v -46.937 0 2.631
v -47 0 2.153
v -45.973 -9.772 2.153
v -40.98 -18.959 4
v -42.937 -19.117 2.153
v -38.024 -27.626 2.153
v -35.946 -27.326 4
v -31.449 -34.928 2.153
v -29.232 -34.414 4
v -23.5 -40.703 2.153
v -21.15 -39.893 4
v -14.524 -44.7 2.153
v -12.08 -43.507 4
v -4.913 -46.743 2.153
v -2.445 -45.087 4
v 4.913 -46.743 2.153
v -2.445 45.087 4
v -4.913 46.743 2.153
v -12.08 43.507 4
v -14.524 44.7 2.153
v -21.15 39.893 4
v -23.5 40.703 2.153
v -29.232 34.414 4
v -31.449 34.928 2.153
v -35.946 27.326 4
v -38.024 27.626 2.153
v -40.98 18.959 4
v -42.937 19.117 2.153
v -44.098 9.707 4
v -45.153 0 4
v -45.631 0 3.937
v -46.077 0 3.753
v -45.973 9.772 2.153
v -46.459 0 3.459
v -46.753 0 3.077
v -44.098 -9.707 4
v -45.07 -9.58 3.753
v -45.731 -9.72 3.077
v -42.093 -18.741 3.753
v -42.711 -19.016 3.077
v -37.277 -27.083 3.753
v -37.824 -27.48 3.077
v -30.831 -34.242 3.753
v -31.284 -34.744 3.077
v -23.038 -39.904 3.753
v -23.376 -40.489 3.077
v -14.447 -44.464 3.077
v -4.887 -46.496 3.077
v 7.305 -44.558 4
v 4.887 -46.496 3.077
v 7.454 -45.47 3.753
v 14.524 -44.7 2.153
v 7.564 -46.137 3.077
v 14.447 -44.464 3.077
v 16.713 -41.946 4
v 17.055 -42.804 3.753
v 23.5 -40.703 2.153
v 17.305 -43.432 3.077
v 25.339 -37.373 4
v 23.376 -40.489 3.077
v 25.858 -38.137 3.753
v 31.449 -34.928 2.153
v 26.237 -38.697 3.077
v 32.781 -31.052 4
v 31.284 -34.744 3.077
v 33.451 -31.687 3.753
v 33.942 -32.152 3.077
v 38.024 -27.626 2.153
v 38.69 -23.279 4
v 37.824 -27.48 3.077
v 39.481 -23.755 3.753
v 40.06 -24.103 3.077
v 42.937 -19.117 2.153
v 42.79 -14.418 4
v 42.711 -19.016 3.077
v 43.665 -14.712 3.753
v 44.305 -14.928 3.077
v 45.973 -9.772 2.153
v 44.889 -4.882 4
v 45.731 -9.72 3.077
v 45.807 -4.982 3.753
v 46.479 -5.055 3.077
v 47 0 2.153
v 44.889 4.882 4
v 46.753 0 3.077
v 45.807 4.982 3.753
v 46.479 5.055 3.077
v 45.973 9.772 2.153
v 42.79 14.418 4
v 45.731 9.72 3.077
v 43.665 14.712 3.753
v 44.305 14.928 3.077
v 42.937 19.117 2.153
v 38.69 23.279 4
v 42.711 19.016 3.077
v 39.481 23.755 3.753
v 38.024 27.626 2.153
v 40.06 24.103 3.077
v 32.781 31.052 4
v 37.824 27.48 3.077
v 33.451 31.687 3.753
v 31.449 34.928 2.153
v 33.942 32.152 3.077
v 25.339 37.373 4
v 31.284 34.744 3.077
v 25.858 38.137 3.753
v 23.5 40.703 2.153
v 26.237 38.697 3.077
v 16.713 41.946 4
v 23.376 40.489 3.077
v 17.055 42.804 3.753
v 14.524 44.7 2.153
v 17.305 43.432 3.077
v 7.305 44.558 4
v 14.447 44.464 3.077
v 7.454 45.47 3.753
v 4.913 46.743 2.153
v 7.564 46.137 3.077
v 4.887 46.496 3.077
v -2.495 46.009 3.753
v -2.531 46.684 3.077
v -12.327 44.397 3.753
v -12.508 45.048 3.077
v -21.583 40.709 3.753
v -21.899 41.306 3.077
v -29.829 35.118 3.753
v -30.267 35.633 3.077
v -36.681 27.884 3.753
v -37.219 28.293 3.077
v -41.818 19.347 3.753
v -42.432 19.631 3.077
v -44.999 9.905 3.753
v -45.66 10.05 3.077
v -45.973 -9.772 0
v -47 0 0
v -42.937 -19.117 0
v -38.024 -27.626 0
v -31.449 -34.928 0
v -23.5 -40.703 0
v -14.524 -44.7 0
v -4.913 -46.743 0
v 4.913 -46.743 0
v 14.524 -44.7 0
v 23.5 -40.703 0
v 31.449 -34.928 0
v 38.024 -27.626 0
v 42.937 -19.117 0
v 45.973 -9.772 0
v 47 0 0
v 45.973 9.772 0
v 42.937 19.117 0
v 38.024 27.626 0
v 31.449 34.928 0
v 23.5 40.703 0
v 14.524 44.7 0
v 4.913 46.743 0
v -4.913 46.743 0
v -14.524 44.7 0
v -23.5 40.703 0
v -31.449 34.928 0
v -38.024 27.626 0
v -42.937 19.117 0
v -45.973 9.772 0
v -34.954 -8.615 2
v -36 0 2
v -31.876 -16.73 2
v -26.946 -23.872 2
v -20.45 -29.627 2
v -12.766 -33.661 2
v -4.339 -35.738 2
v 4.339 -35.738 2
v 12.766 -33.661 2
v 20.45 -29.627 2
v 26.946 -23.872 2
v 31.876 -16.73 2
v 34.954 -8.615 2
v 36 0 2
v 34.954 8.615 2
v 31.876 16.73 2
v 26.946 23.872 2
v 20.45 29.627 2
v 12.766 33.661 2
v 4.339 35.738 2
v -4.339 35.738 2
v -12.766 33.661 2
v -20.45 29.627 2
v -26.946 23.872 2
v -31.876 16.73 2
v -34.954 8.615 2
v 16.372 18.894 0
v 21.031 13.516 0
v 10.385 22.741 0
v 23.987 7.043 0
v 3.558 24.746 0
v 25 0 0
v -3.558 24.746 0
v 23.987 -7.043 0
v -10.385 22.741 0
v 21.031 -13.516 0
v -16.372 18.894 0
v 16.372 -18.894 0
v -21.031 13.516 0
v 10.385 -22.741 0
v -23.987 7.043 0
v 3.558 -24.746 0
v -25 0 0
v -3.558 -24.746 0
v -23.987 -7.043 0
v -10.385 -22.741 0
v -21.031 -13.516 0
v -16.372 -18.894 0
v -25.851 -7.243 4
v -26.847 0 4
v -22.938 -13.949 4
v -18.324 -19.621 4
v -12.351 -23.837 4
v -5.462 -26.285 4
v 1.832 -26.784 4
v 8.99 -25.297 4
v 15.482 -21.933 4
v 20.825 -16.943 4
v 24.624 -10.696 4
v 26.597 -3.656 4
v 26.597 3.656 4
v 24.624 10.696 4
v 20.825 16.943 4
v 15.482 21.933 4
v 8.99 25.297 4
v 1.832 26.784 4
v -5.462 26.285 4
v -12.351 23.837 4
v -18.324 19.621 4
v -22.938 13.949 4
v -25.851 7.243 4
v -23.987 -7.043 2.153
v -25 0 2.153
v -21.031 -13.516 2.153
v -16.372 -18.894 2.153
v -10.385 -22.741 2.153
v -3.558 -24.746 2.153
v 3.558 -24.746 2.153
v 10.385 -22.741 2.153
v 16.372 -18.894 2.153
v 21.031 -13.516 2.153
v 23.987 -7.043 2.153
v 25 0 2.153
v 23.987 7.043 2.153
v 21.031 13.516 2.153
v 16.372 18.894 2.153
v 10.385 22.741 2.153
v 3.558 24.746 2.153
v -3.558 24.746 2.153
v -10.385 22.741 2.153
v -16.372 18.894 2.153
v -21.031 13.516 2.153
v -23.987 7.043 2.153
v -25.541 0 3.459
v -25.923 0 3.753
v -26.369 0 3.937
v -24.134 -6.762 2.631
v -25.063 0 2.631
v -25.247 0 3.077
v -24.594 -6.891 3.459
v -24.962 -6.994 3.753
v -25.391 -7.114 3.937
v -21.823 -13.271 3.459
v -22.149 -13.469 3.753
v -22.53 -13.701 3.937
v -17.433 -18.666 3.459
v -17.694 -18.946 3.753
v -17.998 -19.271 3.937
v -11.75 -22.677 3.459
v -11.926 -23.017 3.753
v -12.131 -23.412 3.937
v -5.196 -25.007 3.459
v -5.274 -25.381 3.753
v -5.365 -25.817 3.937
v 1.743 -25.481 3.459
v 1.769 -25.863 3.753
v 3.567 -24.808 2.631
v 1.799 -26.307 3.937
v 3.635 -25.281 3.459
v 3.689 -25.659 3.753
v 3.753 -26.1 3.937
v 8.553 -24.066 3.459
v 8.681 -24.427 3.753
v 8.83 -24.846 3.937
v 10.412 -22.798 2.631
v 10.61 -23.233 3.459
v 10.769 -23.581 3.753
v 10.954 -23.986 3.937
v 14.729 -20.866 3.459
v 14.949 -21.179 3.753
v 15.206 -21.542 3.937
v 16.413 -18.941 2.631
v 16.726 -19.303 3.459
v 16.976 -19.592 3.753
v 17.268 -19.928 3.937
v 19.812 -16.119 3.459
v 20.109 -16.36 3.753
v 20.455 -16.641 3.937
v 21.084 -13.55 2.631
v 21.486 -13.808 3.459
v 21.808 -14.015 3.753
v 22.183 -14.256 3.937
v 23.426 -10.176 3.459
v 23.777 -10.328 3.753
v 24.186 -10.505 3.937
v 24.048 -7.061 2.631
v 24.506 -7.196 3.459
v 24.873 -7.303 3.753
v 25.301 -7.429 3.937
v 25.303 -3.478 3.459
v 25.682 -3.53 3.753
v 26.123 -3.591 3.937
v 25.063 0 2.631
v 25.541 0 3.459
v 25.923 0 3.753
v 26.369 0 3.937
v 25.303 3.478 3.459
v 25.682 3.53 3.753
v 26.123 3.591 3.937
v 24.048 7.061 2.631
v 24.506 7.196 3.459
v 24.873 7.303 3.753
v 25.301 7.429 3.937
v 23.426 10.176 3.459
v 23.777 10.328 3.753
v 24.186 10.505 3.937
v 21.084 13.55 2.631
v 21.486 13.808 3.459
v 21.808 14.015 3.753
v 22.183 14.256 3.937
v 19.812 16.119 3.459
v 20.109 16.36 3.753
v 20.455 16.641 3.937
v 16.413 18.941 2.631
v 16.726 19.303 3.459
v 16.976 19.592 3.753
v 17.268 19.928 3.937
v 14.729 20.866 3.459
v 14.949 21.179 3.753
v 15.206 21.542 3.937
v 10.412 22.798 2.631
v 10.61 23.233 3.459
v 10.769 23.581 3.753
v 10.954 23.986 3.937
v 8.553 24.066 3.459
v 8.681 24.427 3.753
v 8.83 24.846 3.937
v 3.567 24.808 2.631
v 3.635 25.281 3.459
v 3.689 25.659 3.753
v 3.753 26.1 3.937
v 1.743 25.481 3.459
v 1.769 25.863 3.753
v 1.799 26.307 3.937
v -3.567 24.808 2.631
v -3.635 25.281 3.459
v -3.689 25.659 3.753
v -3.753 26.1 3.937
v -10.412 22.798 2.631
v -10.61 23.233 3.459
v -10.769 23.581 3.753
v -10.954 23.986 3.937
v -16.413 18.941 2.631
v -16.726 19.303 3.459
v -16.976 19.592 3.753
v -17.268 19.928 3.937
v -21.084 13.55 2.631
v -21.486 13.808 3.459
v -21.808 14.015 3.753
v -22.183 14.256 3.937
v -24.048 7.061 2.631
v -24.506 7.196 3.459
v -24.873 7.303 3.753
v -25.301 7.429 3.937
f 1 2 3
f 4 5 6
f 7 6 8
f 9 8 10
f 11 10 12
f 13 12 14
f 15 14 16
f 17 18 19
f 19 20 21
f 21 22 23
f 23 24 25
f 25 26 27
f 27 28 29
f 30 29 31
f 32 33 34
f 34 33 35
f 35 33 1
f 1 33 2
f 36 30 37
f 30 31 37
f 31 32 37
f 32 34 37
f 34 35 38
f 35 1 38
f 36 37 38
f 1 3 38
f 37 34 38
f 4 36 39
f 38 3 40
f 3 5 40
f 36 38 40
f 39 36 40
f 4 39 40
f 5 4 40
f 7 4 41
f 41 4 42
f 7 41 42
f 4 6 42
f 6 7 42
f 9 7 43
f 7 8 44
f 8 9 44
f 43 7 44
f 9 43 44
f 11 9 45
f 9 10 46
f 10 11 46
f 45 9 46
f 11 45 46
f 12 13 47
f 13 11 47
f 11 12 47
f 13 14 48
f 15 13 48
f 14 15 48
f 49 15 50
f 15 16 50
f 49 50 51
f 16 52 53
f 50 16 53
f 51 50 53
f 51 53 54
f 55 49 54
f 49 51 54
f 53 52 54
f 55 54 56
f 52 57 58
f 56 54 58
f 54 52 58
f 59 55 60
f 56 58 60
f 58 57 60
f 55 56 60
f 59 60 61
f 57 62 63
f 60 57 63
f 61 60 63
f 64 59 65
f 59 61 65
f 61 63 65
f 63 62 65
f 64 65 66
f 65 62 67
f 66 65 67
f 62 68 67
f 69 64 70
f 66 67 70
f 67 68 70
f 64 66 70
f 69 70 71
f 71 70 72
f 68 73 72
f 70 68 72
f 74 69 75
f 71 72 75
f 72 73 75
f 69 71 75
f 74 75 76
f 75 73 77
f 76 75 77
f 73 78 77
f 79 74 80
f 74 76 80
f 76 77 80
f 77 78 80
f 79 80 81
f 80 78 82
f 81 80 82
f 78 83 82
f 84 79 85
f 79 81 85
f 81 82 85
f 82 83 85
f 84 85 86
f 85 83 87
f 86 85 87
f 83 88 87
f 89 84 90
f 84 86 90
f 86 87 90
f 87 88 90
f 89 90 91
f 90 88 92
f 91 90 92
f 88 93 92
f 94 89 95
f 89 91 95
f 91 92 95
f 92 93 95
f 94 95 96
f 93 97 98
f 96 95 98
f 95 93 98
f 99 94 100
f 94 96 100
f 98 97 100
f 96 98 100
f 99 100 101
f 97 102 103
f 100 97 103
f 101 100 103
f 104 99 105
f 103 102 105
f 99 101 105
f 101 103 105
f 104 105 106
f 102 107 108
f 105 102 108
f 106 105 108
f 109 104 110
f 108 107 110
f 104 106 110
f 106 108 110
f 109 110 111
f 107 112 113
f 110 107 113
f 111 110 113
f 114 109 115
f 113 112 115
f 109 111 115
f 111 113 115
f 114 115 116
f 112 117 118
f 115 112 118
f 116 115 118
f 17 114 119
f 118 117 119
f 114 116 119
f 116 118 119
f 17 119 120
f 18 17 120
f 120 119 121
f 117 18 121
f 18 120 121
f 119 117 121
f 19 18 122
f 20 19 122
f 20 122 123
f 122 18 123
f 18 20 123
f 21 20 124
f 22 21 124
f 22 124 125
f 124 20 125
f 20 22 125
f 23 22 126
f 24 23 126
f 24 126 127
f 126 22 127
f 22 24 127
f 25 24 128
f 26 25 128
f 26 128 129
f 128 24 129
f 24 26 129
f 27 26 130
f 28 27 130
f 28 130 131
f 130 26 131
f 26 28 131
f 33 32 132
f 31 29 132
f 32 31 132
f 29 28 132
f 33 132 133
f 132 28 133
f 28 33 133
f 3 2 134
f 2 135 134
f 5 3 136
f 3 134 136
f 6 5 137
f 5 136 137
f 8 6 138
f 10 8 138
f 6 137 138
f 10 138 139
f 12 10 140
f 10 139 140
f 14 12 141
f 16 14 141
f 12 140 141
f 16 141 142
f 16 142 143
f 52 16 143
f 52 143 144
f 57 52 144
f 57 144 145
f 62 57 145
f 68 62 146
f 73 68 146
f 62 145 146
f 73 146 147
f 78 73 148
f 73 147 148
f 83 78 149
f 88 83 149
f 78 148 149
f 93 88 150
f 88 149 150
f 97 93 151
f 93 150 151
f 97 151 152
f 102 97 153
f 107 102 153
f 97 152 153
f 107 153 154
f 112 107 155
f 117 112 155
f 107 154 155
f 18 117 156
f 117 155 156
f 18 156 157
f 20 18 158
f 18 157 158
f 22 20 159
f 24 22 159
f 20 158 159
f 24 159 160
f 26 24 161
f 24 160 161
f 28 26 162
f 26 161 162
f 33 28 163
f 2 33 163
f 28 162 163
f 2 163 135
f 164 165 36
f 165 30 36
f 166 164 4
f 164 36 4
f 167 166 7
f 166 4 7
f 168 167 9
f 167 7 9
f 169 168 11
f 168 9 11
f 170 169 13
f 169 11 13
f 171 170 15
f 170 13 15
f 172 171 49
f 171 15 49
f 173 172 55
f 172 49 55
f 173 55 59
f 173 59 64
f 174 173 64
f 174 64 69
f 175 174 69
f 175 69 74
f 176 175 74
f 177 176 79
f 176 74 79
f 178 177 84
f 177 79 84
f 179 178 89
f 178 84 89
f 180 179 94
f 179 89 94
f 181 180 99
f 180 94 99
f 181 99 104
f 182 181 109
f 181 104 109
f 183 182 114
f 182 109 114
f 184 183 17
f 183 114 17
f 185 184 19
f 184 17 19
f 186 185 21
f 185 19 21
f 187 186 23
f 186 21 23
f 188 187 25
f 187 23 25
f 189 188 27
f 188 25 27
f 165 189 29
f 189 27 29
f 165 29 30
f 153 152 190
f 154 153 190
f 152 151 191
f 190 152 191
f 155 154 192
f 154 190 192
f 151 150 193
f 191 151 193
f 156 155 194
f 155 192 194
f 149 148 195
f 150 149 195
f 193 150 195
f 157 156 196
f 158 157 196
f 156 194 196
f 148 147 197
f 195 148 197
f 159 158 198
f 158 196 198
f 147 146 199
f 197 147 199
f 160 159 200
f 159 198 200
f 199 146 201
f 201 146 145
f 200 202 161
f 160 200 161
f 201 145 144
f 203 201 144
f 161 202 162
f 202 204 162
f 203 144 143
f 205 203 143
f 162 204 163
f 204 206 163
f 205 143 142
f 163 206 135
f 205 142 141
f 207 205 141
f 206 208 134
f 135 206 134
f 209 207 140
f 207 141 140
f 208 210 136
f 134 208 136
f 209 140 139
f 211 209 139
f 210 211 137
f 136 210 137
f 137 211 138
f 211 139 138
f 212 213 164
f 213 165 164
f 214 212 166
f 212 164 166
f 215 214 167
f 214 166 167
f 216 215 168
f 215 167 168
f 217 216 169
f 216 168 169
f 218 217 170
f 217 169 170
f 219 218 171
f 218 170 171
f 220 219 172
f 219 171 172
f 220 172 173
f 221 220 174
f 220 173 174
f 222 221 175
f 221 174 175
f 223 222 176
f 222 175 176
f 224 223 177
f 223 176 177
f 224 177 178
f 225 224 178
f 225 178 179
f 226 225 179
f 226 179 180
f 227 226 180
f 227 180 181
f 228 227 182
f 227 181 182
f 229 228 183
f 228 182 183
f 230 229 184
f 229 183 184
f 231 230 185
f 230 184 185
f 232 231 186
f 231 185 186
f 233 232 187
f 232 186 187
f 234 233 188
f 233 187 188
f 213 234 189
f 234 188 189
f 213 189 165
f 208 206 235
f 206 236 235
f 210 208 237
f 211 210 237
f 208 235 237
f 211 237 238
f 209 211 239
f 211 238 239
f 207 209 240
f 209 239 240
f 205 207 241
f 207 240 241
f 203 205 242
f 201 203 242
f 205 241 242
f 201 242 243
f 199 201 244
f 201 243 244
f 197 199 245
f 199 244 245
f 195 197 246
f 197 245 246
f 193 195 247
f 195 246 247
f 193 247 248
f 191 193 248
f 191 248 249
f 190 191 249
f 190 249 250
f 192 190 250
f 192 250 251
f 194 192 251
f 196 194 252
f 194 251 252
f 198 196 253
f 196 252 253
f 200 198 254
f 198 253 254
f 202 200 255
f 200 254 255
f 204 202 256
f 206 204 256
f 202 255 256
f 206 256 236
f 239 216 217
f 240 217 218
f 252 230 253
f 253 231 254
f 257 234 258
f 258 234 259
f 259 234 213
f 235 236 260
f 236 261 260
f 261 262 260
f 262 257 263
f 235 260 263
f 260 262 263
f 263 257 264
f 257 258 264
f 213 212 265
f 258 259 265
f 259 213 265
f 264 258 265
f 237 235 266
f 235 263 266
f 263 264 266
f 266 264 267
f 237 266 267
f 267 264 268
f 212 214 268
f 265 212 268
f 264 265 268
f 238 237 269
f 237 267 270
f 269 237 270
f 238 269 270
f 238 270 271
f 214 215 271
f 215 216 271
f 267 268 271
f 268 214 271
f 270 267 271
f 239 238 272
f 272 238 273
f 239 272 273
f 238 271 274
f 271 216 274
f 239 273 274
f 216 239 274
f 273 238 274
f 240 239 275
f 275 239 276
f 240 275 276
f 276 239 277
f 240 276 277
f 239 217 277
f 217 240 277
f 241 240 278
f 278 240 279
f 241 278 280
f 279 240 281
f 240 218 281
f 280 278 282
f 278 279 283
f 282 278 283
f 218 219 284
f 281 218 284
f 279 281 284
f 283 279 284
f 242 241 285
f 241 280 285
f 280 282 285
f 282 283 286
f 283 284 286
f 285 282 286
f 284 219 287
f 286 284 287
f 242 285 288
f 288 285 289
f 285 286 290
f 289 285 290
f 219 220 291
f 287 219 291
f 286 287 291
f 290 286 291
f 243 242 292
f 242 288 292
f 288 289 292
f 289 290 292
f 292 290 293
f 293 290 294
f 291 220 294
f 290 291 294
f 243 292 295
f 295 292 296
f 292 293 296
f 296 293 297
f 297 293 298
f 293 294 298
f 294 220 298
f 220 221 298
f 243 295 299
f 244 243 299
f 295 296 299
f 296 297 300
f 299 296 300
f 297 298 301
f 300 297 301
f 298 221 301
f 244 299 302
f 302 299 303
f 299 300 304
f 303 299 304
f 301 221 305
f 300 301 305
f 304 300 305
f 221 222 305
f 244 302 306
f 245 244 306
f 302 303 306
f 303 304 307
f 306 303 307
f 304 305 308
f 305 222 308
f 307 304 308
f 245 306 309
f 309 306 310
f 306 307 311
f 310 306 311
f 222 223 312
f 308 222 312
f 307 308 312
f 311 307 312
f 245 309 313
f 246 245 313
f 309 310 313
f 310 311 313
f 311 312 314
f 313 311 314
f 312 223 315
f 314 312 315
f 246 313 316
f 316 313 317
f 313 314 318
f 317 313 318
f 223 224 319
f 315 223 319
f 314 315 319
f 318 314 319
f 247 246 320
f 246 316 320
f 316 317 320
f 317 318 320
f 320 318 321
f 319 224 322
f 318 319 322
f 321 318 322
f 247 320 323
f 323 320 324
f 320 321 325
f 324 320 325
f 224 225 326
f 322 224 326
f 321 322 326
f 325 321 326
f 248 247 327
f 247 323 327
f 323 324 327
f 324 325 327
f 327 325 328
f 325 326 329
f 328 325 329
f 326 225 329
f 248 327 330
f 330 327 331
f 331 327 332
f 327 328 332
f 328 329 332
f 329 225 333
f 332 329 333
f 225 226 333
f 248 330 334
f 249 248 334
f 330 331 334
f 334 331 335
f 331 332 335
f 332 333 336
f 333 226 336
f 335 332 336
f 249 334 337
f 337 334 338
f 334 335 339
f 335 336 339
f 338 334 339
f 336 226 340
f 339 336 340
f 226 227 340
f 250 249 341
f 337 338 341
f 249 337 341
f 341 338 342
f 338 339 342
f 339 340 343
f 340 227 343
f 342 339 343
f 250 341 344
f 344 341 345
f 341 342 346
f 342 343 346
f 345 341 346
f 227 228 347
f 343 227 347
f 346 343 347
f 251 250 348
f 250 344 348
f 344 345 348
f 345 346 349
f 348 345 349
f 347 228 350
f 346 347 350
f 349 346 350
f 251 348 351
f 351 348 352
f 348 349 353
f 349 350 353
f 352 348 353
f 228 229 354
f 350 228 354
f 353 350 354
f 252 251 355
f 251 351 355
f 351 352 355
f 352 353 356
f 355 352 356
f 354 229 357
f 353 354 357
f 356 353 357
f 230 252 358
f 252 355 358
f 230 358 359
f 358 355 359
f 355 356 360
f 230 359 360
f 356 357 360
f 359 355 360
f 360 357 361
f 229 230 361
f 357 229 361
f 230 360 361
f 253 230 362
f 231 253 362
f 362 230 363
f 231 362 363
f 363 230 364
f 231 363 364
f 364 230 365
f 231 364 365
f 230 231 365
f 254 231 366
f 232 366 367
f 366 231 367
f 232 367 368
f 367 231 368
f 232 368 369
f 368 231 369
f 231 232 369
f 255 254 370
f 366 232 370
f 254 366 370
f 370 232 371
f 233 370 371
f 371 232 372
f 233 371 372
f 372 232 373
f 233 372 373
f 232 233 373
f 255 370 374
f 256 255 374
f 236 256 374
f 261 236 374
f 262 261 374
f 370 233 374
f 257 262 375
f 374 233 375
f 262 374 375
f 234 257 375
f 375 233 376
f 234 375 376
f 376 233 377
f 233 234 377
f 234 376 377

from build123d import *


with BuildPart() as f1:
    # F0 (on Front) → F1 (revolve)
    with BuildSketch(Plane.XZ):
        with BuildLine():
            Line((-47, 0), (-25, 0))
            Line((-25, 0), (-25, 2.153316))
            ThreePointArc((-25, 2.153316), (-25.540882, 3.45912), (-26.846686, 4.000002))
            Line((-26.846686, 4.000002), (-36, 2))
            Line((-36, 2), (-45.153314, 3.999998))
            ThreePointArc((-45.153314, 3.999998), (-46.459118, 3.459117), (-47, 2.153313))
            Line((-47, 2.153313), (-47, 0))
        make_face()
    revolve(axis=Axis((0, 0, 2), (0, 0, 1)))


solid = f1.part
